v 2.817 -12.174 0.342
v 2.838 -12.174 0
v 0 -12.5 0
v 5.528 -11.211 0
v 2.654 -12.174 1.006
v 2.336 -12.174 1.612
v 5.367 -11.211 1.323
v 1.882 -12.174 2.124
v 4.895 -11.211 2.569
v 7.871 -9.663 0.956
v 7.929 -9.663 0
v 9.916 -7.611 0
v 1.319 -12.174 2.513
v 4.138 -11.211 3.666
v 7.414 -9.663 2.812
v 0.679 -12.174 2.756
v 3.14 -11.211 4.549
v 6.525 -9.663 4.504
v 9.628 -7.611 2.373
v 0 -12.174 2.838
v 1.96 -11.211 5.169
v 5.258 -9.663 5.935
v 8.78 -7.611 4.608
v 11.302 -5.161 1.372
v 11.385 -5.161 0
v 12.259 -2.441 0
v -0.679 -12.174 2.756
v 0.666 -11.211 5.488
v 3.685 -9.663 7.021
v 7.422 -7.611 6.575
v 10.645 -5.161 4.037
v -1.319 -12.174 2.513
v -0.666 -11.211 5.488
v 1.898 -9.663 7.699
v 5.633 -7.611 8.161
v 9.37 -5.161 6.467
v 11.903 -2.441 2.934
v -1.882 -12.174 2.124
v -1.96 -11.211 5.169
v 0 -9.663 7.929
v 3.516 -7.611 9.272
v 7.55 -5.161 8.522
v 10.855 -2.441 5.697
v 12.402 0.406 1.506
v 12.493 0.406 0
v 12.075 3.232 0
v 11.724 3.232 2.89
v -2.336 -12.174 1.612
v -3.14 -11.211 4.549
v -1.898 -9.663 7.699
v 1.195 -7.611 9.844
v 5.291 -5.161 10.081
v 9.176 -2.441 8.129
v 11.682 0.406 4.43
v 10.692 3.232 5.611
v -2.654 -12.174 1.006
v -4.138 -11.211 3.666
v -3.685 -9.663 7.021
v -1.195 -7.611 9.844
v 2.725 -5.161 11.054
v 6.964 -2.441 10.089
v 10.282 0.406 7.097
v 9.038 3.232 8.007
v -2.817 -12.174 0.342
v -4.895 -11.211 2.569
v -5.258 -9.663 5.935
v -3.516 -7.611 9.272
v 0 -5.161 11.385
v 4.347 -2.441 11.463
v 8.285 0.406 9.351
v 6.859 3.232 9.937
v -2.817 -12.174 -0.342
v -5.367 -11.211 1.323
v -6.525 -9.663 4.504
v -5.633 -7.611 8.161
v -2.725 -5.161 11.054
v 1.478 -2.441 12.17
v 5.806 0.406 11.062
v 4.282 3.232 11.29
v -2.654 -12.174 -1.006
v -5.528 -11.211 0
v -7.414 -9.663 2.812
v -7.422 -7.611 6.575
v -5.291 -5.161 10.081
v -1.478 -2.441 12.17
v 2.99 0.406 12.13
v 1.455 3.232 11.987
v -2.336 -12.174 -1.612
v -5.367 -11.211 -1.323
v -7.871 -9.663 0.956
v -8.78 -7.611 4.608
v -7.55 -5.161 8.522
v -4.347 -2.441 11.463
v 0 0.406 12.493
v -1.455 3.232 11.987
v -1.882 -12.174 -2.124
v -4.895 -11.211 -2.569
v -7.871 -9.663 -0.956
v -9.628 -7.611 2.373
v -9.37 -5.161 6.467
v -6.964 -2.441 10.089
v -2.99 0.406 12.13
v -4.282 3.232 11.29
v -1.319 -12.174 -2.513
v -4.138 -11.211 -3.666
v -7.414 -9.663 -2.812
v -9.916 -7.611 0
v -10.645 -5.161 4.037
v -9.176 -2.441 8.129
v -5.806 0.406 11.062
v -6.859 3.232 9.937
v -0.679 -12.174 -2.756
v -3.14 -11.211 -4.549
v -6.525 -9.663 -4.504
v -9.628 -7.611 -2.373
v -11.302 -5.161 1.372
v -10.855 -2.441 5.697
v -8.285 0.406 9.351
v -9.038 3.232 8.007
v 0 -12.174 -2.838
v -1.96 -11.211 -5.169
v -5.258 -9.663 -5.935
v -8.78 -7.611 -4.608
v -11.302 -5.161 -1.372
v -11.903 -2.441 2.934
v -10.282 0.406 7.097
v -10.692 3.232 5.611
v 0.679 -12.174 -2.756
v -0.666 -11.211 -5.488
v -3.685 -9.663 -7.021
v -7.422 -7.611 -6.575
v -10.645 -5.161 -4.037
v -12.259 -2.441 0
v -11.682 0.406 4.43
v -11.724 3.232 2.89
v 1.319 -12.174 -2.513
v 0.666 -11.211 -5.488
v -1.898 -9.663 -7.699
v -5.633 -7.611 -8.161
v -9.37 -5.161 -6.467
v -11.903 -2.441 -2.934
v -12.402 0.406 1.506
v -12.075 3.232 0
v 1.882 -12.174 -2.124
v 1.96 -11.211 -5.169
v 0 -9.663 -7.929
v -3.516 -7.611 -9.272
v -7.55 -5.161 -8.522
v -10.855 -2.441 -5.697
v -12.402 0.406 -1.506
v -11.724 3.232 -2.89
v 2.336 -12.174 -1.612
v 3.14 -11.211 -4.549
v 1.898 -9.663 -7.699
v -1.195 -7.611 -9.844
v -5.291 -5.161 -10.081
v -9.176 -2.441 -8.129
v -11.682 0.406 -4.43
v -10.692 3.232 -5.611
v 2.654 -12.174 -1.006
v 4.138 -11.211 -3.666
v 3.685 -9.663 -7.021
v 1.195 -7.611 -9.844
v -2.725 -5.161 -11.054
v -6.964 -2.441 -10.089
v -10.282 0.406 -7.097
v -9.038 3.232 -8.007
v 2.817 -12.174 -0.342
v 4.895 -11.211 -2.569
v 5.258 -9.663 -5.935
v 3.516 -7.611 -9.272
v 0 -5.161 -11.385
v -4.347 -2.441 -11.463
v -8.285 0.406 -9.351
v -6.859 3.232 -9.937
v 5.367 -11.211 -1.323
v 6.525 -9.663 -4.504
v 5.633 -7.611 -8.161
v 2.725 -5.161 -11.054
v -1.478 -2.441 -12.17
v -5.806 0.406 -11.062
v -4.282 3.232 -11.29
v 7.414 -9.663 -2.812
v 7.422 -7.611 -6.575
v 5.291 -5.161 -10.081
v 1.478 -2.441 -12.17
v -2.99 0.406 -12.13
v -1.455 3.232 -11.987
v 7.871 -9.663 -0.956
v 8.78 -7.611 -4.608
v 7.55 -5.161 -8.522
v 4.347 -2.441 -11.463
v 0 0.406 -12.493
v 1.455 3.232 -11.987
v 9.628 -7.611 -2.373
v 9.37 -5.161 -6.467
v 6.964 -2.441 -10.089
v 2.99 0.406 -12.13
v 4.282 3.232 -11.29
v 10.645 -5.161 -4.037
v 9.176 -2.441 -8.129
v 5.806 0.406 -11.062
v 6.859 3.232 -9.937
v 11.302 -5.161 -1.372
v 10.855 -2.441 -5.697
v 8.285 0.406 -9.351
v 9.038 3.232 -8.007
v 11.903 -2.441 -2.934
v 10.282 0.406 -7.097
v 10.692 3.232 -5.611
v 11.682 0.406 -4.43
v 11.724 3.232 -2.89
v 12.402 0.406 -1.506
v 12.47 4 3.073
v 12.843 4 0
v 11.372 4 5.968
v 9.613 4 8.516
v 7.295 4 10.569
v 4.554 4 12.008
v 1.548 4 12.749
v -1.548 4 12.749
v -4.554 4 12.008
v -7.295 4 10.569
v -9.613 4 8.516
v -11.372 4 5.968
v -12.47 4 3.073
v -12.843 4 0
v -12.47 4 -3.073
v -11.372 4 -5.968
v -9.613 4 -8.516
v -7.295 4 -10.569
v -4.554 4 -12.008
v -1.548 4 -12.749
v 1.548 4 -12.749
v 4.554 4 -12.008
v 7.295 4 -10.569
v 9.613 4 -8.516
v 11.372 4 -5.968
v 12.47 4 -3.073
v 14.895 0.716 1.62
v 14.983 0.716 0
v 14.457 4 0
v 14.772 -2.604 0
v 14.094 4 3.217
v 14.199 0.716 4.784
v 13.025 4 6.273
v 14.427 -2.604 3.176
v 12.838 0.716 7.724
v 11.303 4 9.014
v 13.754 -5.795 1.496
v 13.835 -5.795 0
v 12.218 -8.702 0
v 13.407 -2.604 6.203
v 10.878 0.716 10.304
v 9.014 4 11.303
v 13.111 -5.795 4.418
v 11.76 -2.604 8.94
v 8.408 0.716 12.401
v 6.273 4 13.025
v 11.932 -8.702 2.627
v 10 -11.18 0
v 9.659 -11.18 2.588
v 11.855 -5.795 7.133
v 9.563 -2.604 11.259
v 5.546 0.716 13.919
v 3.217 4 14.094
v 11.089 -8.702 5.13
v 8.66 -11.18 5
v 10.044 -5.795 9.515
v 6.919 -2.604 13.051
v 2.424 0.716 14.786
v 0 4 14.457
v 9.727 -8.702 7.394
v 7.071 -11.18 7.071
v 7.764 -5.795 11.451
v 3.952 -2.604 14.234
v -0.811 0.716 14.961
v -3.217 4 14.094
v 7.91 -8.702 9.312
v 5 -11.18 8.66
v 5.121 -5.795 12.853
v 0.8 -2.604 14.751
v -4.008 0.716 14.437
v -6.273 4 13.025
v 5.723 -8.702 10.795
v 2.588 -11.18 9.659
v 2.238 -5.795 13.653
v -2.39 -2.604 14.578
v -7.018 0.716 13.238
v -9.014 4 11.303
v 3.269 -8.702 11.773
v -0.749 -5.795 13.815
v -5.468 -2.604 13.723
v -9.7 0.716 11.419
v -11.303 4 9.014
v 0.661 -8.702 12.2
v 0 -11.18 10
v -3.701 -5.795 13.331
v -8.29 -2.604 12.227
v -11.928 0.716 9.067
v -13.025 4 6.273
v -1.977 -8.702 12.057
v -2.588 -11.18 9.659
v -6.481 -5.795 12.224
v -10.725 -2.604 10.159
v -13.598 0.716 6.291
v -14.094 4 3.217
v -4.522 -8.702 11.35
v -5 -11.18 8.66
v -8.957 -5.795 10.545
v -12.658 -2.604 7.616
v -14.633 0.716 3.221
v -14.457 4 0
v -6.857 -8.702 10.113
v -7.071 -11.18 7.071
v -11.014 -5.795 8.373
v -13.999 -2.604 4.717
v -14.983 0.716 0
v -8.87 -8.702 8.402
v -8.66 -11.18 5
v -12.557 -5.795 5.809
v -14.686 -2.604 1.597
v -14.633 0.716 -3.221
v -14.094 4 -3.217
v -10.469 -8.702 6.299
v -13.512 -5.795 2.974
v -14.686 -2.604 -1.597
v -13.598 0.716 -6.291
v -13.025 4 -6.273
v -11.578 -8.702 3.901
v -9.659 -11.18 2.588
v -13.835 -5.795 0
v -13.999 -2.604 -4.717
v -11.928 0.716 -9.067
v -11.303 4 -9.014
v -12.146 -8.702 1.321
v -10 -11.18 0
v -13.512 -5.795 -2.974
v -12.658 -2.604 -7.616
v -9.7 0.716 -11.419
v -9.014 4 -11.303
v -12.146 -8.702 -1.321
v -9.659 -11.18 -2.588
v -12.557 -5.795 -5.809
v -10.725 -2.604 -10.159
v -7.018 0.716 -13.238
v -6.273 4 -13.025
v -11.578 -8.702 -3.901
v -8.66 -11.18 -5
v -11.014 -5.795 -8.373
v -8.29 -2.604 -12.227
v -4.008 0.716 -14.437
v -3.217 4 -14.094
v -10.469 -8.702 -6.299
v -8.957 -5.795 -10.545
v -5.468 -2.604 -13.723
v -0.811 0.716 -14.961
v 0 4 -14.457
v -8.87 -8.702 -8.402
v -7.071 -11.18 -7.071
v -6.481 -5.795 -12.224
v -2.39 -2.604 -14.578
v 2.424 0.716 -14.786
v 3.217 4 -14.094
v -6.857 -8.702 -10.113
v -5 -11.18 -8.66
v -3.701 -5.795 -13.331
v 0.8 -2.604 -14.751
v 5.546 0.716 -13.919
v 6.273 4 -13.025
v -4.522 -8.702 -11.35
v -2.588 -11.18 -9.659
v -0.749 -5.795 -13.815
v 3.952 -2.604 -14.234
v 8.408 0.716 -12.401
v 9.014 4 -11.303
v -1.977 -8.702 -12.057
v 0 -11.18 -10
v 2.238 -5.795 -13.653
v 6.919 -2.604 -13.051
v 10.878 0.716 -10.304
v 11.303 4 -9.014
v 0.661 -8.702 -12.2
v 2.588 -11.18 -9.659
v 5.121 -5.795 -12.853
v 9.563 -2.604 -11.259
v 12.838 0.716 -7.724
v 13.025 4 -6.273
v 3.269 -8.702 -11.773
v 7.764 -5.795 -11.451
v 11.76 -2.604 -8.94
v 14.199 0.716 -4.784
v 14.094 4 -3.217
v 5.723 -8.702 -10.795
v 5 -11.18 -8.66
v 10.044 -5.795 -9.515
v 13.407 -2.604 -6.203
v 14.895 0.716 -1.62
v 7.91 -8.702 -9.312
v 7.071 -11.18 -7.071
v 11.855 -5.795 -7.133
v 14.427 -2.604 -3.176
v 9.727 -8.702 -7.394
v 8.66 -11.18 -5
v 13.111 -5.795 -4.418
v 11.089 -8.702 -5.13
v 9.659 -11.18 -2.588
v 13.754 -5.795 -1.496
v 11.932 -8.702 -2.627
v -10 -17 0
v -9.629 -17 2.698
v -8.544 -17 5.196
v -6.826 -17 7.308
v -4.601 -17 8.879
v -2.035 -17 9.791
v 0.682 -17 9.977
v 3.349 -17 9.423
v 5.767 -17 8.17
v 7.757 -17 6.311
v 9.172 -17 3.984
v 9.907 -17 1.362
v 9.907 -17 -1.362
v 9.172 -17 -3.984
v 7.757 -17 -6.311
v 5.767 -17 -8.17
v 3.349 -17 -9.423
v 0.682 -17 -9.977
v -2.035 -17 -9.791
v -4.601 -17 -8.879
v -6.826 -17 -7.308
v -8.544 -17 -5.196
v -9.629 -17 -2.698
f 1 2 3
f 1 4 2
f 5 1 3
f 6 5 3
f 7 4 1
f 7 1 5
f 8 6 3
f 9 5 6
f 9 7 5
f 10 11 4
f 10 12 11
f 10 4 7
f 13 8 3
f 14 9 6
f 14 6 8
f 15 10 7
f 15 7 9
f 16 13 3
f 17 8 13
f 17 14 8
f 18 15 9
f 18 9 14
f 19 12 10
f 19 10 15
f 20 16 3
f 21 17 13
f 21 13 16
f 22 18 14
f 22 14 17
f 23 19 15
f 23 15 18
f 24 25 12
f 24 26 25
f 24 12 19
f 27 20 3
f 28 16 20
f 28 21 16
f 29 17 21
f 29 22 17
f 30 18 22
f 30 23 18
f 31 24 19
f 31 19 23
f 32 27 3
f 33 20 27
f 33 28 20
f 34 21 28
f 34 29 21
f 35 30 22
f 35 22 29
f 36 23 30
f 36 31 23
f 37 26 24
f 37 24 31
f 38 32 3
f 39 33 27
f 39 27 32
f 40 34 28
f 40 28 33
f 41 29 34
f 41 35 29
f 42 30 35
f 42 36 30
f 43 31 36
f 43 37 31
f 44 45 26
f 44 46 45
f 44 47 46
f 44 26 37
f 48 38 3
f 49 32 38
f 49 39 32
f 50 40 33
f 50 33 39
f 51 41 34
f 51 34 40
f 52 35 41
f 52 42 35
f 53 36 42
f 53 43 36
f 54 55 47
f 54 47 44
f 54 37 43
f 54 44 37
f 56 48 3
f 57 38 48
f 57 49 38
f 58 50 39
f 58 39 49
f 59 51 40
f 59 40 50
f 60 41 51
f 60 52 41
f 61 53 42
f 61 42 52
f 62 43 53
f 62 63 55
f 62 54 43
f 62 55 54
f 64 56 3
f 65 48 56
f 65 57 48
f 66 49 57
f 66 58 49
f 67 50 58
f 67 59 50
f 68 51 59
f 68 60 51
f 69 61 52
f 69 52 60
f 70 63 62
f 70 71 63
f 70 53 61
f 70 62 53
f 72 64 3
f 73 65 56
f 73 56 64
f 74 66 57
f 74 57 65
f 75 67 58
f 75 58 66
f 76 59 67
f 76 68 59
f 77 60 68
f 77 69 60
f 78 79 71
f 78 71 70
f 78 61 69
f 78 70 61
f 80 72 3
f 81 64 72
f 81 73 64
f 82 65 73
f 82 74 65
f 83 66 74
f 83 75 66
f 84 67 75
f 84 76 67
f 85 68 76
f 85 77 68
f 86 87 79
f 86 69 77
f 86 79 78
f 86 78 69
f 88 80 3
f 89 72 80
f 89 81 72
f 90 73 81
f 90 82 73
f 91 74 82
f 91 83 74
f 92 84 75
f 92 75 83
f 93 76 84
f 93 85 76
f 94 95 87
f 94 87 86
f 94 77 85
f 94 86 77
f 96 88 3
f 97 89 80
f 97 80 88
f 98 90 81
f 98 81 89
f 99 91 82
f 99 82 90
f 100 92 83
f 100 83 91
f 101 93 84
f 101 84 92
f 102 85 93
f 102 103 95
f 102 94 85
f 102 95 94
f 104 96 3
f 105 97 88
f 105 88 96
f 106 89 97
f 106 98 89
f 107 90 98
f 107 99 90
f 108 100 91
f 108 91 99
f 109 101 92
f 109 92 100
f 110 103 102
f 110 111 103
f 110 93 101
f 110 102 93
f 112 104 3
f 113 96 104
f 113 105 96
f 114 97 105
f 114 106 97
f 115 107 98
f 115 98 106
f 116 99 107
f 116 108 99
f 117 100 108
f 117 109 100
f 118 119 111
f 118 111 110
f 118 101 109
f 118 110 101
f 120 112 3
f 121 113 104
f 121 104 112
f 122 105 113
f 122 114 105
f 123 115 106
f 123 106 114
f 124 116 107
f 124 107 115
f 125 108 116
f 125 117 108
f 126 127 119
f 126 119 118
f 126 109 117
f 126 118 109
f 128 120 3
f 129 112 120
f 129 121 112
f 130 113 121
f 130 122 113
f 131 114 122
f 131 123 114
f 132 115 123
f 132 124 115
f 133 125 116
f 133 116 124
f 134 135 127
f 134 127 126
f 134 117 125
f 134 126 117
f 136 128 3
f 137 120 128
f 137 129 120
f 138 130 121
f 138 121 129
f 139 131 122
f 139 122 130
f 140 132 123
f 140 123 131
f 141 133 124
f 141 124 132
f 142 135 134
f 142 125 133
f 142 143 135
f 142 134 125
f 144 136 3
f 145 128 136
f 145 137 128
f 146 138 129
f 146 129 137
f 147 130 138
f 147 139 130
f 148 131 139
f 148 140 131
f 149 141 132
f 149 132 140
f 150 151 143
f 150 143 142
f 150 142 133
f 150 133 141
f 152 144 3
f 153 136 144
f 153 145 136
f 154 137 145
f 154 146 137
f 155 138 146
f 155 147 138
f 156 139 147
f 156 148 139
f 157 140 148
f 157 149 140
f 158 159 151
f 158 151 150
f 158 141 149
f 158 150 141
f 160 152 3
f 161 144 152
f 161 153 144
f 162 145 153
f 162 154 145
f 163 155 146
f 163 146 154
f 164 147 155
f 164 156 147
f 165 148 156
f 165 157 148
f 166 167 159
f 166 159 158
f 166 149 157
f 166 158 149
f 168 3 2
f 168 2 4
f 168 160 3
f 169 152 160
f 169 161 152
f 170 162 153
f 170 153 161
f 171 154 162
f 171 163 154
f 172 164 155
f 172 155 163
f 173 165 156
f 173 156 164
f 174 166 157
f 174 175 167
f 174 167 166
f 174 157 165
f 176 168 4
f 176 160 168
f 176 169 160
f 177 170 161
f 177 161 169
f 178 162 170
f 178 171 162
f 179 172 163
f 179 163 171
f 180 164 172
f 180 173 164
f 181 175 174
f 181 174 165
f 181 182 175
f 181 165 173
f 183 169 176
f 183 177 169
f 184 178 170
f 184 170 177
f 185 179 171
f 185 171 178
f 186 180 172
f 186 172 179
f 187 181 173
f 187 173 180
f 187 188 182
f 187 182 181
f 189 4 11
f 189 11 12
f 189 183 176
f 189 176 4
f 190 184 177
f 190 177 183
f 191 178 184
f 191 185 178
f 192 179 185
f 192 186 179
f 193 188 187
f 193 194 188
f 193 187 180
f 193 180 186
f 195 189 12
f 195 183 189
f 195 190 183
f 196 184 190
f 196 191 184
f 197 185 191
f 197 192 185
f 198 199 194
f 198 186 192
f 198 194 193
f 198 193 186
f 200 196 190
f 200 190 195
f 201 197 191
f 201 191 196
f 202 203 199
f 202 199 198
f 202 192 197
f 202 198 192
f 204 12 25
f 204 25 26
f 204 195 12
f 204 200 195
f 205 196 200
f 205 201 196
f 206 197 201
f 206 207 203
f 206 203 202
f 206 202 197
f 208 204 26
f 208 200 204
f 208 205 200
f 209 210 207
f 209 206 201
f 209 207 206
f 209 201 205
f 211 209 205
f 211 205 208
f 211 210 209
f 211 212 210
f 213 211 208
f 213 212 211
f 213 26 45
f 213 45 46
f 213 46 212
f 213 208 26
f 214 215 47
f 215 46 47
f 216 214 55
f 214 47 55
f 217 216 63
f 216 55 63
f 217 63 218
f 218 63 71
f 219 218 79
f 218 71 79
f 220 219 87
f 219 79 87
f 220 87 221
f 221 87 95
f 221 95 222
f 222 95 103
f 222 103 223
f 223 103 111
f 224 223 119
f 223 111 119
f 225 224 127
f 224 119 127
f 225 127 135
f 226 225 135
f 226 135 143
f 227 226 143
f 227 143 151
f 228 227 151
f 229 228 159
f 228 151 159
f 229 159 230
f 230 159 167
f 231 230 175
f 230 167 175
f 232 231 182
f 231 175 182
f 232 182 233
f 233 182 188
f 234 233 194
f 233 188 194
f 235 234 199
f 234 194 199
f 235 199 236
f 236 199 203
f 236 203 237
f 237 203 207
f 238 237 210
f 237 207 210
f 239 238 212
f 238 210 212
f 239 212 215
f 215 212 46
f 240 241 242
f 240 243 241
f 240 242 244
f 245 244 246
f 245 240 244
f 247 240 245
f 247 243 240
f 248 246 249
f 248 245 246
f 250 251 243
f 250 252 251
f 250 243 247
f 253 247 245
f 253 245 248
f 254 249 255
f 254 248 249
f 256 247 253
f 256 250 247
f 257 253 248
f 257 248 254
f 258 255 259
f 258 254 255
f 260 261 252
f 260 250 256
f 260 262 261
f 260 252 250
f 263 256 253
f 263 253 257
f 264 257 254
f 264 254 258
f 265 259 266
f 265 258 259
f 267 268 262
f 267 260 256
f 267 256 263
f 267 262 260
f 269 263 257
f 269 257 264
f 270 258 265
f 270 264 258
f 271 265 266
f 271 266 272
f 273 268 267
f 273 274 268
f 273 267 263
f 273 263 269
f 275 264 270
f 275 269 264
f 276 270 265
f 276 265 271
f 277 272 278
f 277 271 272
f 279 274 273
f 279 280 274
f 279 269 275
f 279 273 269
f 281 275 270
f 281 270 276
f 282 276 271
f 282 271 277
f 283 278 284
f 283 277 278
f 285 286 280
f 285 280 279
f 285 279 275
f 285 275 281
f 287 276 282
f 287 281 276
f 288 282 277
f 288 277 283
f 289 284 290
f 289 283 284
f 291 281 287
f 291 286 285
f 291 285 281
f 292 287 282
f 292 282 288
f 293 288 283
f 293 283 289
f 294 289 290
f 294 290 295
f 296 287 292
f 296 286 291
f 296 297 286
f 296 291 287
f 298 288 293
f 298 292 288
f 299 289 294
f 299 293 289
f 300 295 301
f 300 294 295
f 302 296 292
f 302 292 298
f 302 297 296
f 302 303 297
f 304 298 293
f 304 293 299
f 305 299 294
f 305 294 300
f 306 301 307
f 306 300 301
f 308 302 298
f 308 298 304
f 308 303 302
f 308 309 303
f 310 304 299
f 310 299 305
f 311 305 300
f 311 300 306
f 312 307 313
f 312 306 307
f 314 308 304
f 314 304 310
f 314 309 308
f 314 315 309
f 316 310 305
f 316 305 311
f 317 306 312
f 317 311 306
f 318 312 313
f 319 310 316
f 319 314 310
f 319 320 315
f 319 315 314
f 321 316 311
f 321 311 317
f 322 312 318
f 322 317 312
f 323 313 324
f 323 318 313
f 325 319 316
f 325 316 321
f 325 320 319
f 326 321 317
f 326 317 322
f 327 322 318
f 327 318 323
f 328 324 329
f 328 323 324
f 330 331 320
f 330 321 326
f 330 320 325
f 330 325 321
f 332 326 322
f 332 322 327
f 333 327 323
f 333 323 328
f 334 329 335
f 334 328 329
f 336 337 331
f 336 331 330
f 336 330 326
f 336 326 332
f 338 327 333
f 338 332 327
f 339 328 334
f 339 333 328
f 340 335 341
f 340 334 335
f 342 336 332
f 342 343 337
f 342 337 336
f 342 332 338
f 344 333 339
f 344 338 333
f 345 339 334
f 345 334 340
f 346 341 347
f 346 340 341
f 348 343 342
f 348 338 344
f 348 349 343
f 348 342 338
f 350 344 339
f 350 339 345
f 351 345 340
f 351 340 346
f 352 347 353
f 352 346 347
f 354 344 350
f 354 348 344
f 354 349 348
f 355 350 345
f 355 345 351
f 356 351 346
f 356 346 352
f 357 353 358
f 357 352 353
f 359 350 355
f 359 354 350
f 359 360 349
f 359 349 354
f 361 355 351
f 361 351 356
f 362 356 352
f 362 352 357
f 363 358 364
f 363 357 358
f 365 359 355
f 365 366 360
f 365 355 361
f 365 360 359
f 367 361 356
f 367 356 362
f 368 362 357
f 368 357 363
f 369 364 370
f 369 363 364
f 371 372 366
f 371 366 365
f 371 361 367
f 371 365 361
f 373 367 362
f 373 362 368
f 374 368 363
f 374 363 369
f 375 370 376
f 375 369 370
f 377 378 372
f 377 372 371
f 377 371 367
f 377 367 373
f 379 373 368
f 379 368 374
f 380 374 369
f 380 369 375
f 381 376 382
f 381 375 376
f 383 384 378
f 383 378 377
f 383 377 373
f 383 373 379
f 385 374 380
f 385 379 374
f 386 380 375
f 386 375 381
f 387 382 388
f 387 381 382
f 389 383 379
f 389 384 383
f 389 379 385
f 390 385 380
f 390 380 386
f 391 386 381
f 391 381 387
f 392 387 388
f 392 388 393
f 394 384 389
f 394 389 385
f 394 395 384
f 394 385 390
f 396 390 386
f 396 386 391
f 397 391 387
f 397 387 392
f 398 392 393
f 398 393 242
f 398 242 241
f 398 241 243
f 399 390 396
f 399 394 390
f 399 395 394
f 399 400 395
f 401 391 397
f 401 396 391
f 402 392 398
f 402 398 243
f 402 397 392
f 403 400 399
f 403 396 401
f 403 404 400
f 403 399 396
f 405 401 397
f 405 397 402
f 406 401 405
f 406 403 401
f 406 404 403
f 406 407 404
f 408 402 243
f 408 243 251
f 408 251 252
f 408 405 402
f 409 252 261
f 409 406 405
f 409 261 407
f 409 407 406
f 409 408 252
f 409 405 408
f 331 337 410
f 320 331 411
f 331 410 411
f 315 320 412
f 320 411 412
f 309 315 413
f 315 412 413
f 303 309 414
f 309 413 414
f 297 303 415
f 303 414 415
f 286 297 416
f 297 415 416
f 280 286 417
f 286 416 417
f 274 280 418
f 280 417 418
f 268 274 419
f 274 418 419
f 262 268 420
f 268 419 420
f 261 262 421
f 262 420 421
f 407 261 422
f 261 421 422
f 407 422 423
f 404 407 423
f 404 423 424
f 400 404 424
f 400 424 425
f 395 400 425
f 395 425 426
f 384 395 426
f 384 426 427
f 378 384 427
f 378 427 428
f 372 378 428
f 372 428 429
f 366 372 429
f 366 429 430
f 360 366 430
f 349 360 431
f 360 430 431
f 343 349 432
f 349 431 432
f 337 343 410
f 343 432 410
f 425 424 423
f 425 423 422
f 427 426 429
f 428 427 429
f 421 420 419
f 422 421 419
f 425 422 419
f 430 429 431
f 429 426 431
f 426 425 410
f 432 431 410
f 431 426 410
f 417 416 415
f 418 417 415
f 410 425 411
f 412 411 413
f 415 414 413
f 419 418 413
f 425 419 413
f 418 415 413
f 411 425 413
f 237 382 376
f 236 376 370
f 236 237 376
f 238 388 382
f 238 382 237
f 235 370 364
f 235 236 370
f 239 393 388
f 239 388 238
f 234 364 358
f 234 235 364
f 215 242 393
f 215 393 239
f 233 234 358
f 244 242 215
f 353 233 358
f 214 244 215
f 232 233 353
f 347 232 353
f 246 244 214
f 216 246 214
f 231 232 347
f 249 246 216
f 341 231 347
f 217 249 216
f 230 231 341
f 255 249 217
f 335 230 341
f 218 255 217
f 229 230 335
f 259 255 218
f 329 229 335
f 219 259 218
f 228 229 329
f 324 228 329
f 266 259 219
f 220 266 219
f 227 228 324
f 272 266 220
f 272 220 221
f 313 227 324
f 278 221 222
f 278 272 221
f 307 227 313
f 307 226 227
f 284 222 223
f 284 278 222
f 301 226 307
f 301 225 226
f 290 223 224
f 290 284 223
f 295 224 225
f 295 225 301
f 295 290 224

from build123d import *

# Parameters (mm, degrees)
BOSS_EXTRUDE1_REACH      = 44.981
BOSS_EXTRUDE1_END_RADIUS = 15
BOSS_EXTRUDE1_START      = -17
SKETCH2_R                = 10
CHAMFER1_SIZE            = 1


with BuildPart() as part:
    # Sketch1 → Revolve1 (revolve)
    with BuildSketch(Plane.XY):
        with BuildLine():
            Line((11.842719282, 4), (14.456832295, 4))
            ThreePointArc((14.456832295, 4), (11.937336386, -9.082951062), (0, -15))
            Line((0, -15), (0, -12.5))
            ThreePointArc((0, -12.5), (10.155048006, -7.288689869), (11.842719282, 4))
        make_face()
    revolve(axis=Axis((0, 23.994682016, 0), (0, -1, 0)))

    # Boss-Extrude1: up to this sphere (the profile starts outside it)
    boss_extrude1_end = Location((0, 0, 0)) * Sphere(BOSS_EXTRUDE1_END_RADIUS, mode=Mode.PRIVATE)
    # Sketch2 → Boss-Extrude1 (add, up to the surface)
    with BuildSketch(Plane(origin=(0, 0, 0), x_dir=(1, 0, 0), z_dir=(0, 1, 0)).offset(BOSS_EXTRUDE1_START), mode=Mode.PRIVATE) as boss_extrude1_sk1:
        with Locations(Location((0, 0, 0), (0, 0, 180))):
            Circle(SKETCH2_R)
    boss_extrude1_tool1 = extrude(boss_extrude1_sk1.sketch, amount=BOSS_EXTRUDE1_REACH, mode=Mode.PRIVATE) - boss_extrude1_end
    add(boss_extrude1_tool1.solids().sort_by_distance((0, -17, 0))[0])

    # Chamfer1
    # the kernel refuses this chamfer: 1, 0.789005964 mm, written as the material it takes off along each edge
    with BuildSketch(Plane(origin=(0, 4, 0), x_dir=(1, 0, 0), z_dir=(0, 0, -1))) as chamfer1_piece_1:
        with BuildLine():
            Line((11.842719282 + CHAMFER1_SIZE, 0), (12.074893395, 0.767825887))
            ThreePointArc((12.074893395, 0.767825887), (11.967702274, 0.391107888), (11.842719282, 0))
            Line((11.842719282, 0), (11.842719282 + CHAMFER1_SIZE, 0))
        make_face()
    revolve(axis=Axis((0, 4, 0), (0, -1, 0)), mode=Mode.SUBTRACT)


solid = part.part
